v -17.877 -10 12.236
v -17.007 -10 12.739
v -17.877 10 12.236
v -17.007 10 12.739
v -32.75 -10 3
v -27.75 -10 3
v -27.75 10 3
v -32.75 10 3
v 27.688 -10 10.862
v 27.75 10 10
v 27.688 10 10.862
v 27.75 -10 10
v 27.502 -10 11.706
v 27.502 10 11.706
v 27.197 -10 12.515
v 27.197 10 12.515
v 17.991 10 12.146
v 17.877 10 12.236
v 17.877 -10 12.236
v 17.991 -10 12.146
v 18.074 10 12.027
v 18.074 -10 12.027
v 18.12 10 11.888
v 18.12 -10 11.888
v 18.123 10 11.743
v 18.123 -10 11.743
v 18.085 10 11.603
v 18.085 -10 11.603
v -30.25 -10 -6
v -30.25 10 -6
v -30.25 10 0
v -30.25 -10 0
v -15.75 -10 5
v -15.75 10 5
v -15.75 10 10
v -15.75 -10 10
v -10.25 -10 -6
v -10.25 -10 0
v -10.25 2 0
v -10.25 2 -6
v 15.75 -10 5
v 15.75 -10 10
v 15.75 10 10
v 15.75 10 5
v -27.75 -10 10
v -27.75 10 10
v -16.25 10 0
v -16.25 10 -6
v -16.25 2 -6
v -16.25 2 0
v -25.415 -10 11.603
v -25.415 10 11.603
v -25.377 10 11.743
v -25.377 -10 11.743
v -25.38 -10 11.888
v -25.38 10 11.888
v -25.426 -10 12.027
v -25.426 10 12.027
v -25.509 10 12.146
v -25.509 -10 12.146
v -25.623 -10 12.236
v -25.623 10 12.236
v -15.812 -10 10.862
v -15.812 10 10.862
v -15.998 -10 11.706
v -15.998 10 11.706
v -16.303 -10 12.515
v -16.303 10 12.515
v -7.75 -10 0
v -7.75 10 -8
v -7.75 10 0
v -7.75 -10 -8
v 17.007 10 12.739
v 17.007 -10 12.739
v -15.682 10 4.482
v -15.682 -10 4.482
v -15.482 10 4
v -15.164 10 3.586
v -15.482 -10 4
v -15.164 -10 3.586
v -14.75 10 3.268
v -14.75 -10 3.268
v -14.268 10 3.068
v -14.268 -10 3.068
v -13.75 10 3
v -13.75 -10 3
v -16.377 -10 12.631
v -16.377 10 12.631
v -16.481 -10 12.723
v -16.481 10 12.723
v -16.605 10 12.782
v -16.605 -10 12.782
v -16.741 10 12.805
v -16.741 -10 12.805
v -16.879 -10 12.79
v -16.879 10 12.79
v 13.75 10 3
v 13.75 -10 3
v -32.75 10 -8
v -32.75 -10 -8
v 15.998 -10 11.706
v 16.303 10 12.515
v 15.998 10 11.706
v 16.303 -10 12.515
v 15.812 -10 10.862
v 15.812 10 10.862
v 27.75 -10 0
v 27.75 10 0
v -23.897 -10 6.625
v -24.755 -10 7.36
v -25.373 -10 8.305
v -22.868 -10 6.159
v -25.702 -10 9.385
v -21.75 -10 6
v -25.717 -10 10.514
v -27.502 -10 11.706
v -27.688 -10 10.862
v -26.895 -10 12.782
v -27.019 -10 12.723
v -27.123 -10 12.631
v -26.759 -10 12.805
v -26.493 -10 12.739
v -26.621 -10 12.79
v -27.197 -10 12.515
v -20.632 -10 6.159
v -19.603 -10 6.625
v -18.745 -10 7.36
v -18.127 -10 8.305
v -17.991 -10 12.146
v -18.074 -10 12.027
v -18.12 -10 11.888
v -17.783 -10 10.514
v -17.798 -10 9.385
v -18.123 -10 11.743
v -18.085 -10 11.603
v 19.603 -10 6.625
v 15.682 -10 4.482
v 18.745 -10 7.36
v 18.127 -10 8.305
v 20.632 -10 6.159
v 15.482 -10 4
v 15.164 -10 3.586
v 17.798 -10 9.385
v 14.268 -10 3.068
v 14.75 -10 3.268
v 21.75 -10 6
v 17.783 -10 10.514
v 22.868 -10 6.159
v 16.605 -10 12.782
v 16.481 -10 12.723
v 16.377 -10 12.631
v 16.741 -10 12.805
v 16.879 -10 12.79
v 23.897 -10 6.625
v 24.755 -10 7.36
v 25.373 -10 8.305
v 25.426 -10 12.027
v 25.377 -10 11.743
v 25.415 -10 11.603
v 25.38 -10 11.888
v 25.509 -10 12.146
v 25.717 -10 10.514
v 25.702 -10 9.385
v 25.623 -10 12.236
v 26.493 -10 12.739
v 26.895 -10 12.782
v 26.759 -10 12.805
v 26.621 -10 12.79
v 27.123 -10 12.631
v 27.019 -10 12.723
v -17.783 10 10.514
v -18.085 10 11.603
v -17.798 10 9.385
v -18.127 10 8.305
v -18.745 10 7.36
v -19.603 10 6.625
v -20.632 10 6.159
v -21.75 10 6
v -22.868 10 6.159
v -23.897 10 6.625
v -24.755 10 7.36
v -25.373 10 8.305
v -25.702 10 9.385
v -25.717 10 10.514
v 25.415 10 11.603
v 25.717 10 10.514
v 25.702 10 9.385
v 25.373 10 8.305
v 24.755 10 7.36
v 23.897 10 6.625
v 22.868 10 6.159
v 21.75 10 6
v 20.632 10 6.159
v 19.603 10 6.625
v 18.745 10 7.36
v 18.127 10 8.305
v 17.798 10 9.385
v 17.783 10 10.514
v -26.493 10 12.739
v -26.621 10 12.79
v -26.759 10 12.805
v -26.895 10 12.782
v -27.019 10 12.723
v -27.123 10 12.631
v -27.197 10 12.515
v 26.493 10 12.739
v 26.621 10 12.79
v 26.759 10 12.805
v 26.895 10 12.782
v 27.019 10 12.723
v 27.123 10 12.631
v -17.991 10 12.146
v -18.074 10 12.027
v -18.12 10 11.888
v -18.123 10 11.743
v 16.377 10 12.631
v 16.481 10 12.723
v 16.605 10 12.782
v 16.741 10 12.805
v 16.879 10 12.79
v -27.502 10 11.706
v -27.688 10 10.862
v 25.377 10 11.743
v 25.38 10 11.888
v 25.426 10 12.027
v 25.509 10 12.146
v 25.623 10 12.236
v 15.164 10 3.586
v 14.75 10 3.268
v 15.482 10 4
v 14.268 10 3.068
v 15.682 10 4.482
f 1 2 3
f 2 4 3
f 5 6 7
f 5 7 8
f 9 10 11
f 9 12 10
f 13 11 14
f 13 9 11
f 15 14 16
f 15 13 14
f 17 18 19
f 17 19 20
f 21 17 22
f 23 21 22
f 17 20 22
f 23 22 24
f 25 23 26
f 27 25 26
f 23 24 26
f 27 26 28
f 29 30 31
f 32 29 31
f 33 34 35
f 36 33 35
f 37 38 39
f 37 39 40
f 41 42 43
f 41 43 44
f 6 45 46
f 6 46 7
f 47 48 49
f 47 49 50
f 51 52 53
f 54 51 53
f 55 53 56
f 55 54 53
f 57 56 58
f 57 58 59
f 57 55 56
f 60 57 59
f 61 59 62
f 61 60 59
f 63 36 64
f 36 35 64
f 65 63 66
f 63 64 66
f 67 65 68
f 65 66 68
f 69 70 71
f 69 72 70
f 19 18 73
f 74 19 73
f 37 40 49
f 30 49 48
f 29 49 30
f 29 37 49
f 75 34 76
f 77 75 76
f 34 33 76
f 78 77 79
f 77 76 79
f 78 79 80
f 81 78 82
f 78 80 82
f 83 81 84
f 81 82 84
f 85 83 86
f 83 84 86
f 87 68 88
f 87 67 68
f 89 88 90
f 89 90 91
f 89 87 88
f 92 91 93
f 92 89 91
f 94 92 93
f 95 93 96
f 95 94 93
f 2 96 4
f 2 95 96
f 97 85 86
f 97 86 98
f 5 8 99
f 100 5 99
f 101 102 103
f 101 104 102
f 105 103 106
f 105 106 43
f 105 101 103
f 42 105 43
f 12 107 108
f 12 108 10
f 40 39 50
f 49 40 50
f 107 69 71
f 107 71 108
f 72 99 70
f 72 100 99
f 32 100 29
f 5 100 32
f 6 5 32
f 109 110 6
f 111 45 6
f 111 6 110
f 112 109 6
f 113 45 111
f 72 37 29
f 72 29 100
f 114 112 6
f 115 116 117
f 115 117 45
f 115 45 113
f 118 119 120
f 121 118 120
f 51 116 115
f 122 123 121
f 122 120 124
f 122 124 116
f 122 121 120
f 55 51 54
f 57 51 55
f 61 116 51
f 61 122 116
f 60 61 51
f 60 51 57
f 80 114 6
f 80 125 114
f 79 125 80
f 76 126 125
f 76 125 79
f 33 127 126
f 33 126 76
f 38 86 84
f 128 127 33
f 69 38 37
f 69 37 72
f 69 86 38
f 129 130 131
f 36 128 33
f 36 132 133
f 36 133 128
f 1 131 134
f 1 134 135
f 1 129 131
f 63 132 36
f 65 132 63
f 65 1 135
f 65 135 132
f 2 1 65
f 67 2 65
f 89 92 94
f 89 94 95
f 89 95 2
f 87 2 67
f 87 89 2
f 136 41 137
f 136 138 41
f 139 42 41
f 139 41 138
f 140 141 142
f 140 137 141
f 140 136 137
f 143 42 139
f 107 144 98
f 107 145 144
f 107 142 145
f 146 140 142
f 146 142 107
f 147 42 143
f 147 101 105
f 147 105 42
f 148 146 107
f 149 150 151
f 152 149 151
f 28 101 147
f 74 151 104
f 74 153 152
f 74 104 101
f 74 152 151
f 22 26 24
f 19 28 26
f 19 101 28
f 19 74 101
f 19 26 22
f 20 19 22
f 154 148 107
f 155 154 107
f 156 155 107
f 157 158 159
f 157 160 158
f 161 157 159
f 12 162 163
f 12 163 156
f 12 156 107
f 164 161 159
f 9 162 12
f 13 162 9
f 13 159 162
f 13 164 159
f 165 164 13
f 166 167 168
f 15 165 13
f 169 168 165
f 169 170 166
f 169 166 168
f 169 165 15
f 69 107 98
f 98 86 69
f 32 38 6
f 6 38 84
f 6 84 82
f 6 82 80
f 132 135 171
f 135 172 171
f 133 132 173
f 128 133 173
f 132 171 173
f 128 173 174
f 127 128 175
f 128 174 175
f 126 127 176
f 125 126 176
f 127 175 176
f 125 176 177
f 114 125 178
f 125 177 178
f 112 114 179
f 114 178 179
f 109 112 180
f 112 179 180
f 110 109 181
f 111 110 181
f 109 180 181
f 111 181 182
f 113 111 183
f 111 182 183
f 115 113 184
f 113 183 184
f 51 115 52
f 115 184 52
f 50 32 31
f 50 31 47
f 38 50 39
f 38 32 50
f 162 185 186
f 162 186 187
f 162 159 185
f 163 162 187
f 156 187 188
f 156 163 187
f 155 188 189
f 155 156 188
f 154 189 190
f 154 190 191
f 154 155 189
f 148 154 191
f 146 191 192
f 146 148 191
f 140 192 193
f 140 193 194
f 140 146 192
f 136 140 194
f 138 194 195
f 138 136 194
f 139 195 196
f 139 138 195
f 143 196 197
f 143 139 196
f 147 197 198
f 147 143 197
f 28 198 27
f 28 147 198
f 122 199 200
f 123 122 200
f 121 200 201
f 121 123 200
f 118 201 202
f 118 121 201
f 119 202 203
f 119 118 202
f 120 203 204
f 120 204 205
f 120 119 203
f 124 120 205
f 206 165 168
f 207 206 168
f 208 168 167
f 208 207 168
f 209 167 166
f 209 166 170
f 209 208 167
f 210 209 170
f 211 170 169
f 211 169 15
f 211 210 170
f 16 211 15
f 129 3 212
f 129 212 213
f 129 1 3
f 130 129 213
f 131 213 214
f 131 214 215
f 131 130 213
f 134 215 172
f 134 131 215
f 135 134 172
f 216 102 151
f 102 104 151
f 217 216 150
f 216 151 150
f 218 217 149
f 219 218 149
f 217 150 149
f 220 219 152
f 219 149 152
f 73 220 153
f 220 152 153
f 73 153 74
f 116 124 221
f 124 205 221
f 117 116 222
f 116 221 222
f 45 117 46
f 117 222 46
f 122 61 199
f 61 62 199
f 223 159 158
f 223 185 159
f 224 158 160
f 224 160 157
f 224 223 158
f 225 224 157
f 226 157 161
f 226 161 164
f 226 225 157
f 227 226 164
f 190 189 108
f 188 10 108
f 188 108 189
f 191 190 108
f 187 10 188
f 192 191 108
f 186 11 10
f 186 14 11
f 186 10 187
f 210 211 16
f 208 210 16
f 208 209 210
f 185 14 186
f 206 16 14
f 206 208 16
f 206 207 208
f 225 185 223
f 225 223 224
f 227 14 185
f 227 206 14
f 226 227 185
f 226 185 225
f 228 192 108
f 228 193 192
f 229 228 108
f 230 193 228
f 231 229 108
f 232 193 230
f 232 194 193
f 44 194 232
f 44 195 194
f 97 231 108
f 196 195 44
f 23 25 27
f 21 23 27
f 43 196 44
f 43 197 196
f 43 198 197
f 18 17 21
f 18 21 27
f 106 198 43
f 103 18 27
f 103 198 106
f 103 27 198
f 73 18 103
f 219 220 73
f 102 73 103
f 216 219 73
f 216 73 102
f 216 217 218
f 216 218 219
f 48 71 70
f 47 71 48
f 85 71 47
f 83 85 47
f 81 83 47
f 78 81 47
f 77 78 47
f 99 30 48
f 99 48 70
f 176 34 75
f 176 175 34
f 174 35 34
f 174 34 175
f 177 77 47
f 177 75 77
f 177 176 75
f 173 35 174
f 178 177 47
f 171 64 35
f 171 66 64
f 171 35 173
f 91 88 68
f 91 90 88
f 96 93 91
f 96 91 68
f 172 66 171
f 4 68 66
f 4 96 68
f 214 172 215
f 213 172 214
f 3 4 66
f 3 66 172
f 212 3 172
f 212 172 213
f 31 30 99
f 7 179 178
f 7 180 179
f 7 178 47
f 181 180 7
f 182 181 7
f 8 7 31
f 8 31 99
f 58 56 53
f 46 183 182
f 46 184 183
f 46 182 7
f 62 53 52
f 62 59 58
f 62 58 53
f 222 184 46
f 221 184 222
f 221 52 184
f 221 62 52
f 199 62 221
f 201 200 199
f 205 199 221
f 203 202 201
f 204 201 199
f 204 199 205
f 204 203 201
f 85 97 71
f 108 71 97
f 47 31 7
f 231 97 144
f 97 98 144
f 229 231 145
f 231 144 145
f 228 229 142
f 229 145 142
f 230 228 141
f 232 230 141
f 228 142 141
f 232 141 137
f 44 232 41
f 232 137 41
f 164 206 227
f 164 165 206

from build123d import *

# Parameters (mm, degrees)
F0_W      = 54.5
F0_H      = 20
F1_DEPTH  = 3
F3_DEPTH  = 10
F4_R      = 2
F5_R      = 0.5
F7_DEPTH  = 10
F9_DEPTH  = 20
F10_W     = 6
F10_H     = 6
F11_DEPTH = 8


with BuildPart() as f1:
    # F0 (on Top) → F1 (new body)
    with BuildSketch(Plane.XY):
        Rectangle(F0_W, F0_H)
    extrude(amount=F1_DEPTH)

    # F2 (on Front) → F3 (join, symmetric)
    with BuildSketch(Plane.XZ):
        with BuildLine():
            Line((-15.75, 0), (-15.75, 10))
            ThreePointArc((-15.75, 10), (-15.9544450423, 11.5529142706), (-16.5538475773, 13))
            Line((-16.5538475773, 13), (-18.2858983849, 12))
            ThreePointArc((-18.2858983849, 12), (-21.75, 6), (-25.2141016151, 12))
            Line((-25.2141016151, 12), (-26.9461524227, 13))
            ThreePointArc((-26.9461524227, 13), (-27.5455549577, 11.5529142706), (-27.75, 10))
            Line((-27.75, 10), (-27.75, 0))
            Line((-27.75, 0), (-15.75, 0))
        make_face()
        with BuildLine():
            ThreePointArc((25.2141016151, 12), (21.75, 6), (18.2858983849, 12))
            Line((18.2858983849, 12), (16.5538475773, 13))
            ThreePointArc((16.5538475773, 13), (15.9544450423, 11.5529142706), (15.75, 10))
            Line((15.75, 10), (15.75, 0))
            Line((15.75, 0), (27.75, 0))
            Line((27.75, 0), (27.75, 10))
            ThreePointArc((27.75, 10), (27.5455549577, 11.5529142706), (26.9461524227, 13))
            Line((26.9461524227, 13), (25.2141016151, 12))
        make_face()
    extrude(amount=F3_DEPTH, both=True)

    # F4
    f4_edges = [f1.edges().sort_by_distance(p)[0] for p in [
        (-15.75, 0, 3),
        (15.75, 0, 3),
    ]]
    fillet(f4_edges, radius=F4_R)

    # F5
    f5_edges = [f1.edges().sort_by_distance(p)[0] for p in [
        (-26.946152, 0, 13),
        (-25.214102, 0, 12),
        (-18.285898, 0, 12),
        (-16.553848, 0, 13),
        (18.285898, 0, 12),
        (16.553848, 0, 13),
        (25.214102, 0, 12),
        (26.946152, 0, 13),
    ]]
    fillet(f5_edges, radius=F5_R)

    # F6 (on Front) → F7 (join, symmetric)
    with BuildSketch(Plane.XZ):
        Polygon((-7.75, -8), (-7.75, 0), (-10.25, 0), (-10.25, -6), (-30.25, -6), (-30.25, 0), (-32.75, 0), (-32.75, -8), align=None)
    extrude(amount=F7_DEPTH, both=True)

    # F8 (on face) → F9 (join)
    with BuildSketch(Plane.XZ.offset(10)):
        Polygon((-30.25, 0), (-27.75, 0), (-27.75, 3), (-32.75, 3), (-32.75, 0), align=None)
    extrude(amount=-F9_DEPTH)

    # F10 (on face) → F11 (join)
    with BuildSketch(Plane(origin=(0, 10, 0), x_dir=(-1, 0, 0), z_dir=(0, 1, 0))):
        with Locations((13.25, -3)):
            Rectangle(F10_W, F10_H)
    extrude(amount=-F11_DEPTH)


solid = f1.part
